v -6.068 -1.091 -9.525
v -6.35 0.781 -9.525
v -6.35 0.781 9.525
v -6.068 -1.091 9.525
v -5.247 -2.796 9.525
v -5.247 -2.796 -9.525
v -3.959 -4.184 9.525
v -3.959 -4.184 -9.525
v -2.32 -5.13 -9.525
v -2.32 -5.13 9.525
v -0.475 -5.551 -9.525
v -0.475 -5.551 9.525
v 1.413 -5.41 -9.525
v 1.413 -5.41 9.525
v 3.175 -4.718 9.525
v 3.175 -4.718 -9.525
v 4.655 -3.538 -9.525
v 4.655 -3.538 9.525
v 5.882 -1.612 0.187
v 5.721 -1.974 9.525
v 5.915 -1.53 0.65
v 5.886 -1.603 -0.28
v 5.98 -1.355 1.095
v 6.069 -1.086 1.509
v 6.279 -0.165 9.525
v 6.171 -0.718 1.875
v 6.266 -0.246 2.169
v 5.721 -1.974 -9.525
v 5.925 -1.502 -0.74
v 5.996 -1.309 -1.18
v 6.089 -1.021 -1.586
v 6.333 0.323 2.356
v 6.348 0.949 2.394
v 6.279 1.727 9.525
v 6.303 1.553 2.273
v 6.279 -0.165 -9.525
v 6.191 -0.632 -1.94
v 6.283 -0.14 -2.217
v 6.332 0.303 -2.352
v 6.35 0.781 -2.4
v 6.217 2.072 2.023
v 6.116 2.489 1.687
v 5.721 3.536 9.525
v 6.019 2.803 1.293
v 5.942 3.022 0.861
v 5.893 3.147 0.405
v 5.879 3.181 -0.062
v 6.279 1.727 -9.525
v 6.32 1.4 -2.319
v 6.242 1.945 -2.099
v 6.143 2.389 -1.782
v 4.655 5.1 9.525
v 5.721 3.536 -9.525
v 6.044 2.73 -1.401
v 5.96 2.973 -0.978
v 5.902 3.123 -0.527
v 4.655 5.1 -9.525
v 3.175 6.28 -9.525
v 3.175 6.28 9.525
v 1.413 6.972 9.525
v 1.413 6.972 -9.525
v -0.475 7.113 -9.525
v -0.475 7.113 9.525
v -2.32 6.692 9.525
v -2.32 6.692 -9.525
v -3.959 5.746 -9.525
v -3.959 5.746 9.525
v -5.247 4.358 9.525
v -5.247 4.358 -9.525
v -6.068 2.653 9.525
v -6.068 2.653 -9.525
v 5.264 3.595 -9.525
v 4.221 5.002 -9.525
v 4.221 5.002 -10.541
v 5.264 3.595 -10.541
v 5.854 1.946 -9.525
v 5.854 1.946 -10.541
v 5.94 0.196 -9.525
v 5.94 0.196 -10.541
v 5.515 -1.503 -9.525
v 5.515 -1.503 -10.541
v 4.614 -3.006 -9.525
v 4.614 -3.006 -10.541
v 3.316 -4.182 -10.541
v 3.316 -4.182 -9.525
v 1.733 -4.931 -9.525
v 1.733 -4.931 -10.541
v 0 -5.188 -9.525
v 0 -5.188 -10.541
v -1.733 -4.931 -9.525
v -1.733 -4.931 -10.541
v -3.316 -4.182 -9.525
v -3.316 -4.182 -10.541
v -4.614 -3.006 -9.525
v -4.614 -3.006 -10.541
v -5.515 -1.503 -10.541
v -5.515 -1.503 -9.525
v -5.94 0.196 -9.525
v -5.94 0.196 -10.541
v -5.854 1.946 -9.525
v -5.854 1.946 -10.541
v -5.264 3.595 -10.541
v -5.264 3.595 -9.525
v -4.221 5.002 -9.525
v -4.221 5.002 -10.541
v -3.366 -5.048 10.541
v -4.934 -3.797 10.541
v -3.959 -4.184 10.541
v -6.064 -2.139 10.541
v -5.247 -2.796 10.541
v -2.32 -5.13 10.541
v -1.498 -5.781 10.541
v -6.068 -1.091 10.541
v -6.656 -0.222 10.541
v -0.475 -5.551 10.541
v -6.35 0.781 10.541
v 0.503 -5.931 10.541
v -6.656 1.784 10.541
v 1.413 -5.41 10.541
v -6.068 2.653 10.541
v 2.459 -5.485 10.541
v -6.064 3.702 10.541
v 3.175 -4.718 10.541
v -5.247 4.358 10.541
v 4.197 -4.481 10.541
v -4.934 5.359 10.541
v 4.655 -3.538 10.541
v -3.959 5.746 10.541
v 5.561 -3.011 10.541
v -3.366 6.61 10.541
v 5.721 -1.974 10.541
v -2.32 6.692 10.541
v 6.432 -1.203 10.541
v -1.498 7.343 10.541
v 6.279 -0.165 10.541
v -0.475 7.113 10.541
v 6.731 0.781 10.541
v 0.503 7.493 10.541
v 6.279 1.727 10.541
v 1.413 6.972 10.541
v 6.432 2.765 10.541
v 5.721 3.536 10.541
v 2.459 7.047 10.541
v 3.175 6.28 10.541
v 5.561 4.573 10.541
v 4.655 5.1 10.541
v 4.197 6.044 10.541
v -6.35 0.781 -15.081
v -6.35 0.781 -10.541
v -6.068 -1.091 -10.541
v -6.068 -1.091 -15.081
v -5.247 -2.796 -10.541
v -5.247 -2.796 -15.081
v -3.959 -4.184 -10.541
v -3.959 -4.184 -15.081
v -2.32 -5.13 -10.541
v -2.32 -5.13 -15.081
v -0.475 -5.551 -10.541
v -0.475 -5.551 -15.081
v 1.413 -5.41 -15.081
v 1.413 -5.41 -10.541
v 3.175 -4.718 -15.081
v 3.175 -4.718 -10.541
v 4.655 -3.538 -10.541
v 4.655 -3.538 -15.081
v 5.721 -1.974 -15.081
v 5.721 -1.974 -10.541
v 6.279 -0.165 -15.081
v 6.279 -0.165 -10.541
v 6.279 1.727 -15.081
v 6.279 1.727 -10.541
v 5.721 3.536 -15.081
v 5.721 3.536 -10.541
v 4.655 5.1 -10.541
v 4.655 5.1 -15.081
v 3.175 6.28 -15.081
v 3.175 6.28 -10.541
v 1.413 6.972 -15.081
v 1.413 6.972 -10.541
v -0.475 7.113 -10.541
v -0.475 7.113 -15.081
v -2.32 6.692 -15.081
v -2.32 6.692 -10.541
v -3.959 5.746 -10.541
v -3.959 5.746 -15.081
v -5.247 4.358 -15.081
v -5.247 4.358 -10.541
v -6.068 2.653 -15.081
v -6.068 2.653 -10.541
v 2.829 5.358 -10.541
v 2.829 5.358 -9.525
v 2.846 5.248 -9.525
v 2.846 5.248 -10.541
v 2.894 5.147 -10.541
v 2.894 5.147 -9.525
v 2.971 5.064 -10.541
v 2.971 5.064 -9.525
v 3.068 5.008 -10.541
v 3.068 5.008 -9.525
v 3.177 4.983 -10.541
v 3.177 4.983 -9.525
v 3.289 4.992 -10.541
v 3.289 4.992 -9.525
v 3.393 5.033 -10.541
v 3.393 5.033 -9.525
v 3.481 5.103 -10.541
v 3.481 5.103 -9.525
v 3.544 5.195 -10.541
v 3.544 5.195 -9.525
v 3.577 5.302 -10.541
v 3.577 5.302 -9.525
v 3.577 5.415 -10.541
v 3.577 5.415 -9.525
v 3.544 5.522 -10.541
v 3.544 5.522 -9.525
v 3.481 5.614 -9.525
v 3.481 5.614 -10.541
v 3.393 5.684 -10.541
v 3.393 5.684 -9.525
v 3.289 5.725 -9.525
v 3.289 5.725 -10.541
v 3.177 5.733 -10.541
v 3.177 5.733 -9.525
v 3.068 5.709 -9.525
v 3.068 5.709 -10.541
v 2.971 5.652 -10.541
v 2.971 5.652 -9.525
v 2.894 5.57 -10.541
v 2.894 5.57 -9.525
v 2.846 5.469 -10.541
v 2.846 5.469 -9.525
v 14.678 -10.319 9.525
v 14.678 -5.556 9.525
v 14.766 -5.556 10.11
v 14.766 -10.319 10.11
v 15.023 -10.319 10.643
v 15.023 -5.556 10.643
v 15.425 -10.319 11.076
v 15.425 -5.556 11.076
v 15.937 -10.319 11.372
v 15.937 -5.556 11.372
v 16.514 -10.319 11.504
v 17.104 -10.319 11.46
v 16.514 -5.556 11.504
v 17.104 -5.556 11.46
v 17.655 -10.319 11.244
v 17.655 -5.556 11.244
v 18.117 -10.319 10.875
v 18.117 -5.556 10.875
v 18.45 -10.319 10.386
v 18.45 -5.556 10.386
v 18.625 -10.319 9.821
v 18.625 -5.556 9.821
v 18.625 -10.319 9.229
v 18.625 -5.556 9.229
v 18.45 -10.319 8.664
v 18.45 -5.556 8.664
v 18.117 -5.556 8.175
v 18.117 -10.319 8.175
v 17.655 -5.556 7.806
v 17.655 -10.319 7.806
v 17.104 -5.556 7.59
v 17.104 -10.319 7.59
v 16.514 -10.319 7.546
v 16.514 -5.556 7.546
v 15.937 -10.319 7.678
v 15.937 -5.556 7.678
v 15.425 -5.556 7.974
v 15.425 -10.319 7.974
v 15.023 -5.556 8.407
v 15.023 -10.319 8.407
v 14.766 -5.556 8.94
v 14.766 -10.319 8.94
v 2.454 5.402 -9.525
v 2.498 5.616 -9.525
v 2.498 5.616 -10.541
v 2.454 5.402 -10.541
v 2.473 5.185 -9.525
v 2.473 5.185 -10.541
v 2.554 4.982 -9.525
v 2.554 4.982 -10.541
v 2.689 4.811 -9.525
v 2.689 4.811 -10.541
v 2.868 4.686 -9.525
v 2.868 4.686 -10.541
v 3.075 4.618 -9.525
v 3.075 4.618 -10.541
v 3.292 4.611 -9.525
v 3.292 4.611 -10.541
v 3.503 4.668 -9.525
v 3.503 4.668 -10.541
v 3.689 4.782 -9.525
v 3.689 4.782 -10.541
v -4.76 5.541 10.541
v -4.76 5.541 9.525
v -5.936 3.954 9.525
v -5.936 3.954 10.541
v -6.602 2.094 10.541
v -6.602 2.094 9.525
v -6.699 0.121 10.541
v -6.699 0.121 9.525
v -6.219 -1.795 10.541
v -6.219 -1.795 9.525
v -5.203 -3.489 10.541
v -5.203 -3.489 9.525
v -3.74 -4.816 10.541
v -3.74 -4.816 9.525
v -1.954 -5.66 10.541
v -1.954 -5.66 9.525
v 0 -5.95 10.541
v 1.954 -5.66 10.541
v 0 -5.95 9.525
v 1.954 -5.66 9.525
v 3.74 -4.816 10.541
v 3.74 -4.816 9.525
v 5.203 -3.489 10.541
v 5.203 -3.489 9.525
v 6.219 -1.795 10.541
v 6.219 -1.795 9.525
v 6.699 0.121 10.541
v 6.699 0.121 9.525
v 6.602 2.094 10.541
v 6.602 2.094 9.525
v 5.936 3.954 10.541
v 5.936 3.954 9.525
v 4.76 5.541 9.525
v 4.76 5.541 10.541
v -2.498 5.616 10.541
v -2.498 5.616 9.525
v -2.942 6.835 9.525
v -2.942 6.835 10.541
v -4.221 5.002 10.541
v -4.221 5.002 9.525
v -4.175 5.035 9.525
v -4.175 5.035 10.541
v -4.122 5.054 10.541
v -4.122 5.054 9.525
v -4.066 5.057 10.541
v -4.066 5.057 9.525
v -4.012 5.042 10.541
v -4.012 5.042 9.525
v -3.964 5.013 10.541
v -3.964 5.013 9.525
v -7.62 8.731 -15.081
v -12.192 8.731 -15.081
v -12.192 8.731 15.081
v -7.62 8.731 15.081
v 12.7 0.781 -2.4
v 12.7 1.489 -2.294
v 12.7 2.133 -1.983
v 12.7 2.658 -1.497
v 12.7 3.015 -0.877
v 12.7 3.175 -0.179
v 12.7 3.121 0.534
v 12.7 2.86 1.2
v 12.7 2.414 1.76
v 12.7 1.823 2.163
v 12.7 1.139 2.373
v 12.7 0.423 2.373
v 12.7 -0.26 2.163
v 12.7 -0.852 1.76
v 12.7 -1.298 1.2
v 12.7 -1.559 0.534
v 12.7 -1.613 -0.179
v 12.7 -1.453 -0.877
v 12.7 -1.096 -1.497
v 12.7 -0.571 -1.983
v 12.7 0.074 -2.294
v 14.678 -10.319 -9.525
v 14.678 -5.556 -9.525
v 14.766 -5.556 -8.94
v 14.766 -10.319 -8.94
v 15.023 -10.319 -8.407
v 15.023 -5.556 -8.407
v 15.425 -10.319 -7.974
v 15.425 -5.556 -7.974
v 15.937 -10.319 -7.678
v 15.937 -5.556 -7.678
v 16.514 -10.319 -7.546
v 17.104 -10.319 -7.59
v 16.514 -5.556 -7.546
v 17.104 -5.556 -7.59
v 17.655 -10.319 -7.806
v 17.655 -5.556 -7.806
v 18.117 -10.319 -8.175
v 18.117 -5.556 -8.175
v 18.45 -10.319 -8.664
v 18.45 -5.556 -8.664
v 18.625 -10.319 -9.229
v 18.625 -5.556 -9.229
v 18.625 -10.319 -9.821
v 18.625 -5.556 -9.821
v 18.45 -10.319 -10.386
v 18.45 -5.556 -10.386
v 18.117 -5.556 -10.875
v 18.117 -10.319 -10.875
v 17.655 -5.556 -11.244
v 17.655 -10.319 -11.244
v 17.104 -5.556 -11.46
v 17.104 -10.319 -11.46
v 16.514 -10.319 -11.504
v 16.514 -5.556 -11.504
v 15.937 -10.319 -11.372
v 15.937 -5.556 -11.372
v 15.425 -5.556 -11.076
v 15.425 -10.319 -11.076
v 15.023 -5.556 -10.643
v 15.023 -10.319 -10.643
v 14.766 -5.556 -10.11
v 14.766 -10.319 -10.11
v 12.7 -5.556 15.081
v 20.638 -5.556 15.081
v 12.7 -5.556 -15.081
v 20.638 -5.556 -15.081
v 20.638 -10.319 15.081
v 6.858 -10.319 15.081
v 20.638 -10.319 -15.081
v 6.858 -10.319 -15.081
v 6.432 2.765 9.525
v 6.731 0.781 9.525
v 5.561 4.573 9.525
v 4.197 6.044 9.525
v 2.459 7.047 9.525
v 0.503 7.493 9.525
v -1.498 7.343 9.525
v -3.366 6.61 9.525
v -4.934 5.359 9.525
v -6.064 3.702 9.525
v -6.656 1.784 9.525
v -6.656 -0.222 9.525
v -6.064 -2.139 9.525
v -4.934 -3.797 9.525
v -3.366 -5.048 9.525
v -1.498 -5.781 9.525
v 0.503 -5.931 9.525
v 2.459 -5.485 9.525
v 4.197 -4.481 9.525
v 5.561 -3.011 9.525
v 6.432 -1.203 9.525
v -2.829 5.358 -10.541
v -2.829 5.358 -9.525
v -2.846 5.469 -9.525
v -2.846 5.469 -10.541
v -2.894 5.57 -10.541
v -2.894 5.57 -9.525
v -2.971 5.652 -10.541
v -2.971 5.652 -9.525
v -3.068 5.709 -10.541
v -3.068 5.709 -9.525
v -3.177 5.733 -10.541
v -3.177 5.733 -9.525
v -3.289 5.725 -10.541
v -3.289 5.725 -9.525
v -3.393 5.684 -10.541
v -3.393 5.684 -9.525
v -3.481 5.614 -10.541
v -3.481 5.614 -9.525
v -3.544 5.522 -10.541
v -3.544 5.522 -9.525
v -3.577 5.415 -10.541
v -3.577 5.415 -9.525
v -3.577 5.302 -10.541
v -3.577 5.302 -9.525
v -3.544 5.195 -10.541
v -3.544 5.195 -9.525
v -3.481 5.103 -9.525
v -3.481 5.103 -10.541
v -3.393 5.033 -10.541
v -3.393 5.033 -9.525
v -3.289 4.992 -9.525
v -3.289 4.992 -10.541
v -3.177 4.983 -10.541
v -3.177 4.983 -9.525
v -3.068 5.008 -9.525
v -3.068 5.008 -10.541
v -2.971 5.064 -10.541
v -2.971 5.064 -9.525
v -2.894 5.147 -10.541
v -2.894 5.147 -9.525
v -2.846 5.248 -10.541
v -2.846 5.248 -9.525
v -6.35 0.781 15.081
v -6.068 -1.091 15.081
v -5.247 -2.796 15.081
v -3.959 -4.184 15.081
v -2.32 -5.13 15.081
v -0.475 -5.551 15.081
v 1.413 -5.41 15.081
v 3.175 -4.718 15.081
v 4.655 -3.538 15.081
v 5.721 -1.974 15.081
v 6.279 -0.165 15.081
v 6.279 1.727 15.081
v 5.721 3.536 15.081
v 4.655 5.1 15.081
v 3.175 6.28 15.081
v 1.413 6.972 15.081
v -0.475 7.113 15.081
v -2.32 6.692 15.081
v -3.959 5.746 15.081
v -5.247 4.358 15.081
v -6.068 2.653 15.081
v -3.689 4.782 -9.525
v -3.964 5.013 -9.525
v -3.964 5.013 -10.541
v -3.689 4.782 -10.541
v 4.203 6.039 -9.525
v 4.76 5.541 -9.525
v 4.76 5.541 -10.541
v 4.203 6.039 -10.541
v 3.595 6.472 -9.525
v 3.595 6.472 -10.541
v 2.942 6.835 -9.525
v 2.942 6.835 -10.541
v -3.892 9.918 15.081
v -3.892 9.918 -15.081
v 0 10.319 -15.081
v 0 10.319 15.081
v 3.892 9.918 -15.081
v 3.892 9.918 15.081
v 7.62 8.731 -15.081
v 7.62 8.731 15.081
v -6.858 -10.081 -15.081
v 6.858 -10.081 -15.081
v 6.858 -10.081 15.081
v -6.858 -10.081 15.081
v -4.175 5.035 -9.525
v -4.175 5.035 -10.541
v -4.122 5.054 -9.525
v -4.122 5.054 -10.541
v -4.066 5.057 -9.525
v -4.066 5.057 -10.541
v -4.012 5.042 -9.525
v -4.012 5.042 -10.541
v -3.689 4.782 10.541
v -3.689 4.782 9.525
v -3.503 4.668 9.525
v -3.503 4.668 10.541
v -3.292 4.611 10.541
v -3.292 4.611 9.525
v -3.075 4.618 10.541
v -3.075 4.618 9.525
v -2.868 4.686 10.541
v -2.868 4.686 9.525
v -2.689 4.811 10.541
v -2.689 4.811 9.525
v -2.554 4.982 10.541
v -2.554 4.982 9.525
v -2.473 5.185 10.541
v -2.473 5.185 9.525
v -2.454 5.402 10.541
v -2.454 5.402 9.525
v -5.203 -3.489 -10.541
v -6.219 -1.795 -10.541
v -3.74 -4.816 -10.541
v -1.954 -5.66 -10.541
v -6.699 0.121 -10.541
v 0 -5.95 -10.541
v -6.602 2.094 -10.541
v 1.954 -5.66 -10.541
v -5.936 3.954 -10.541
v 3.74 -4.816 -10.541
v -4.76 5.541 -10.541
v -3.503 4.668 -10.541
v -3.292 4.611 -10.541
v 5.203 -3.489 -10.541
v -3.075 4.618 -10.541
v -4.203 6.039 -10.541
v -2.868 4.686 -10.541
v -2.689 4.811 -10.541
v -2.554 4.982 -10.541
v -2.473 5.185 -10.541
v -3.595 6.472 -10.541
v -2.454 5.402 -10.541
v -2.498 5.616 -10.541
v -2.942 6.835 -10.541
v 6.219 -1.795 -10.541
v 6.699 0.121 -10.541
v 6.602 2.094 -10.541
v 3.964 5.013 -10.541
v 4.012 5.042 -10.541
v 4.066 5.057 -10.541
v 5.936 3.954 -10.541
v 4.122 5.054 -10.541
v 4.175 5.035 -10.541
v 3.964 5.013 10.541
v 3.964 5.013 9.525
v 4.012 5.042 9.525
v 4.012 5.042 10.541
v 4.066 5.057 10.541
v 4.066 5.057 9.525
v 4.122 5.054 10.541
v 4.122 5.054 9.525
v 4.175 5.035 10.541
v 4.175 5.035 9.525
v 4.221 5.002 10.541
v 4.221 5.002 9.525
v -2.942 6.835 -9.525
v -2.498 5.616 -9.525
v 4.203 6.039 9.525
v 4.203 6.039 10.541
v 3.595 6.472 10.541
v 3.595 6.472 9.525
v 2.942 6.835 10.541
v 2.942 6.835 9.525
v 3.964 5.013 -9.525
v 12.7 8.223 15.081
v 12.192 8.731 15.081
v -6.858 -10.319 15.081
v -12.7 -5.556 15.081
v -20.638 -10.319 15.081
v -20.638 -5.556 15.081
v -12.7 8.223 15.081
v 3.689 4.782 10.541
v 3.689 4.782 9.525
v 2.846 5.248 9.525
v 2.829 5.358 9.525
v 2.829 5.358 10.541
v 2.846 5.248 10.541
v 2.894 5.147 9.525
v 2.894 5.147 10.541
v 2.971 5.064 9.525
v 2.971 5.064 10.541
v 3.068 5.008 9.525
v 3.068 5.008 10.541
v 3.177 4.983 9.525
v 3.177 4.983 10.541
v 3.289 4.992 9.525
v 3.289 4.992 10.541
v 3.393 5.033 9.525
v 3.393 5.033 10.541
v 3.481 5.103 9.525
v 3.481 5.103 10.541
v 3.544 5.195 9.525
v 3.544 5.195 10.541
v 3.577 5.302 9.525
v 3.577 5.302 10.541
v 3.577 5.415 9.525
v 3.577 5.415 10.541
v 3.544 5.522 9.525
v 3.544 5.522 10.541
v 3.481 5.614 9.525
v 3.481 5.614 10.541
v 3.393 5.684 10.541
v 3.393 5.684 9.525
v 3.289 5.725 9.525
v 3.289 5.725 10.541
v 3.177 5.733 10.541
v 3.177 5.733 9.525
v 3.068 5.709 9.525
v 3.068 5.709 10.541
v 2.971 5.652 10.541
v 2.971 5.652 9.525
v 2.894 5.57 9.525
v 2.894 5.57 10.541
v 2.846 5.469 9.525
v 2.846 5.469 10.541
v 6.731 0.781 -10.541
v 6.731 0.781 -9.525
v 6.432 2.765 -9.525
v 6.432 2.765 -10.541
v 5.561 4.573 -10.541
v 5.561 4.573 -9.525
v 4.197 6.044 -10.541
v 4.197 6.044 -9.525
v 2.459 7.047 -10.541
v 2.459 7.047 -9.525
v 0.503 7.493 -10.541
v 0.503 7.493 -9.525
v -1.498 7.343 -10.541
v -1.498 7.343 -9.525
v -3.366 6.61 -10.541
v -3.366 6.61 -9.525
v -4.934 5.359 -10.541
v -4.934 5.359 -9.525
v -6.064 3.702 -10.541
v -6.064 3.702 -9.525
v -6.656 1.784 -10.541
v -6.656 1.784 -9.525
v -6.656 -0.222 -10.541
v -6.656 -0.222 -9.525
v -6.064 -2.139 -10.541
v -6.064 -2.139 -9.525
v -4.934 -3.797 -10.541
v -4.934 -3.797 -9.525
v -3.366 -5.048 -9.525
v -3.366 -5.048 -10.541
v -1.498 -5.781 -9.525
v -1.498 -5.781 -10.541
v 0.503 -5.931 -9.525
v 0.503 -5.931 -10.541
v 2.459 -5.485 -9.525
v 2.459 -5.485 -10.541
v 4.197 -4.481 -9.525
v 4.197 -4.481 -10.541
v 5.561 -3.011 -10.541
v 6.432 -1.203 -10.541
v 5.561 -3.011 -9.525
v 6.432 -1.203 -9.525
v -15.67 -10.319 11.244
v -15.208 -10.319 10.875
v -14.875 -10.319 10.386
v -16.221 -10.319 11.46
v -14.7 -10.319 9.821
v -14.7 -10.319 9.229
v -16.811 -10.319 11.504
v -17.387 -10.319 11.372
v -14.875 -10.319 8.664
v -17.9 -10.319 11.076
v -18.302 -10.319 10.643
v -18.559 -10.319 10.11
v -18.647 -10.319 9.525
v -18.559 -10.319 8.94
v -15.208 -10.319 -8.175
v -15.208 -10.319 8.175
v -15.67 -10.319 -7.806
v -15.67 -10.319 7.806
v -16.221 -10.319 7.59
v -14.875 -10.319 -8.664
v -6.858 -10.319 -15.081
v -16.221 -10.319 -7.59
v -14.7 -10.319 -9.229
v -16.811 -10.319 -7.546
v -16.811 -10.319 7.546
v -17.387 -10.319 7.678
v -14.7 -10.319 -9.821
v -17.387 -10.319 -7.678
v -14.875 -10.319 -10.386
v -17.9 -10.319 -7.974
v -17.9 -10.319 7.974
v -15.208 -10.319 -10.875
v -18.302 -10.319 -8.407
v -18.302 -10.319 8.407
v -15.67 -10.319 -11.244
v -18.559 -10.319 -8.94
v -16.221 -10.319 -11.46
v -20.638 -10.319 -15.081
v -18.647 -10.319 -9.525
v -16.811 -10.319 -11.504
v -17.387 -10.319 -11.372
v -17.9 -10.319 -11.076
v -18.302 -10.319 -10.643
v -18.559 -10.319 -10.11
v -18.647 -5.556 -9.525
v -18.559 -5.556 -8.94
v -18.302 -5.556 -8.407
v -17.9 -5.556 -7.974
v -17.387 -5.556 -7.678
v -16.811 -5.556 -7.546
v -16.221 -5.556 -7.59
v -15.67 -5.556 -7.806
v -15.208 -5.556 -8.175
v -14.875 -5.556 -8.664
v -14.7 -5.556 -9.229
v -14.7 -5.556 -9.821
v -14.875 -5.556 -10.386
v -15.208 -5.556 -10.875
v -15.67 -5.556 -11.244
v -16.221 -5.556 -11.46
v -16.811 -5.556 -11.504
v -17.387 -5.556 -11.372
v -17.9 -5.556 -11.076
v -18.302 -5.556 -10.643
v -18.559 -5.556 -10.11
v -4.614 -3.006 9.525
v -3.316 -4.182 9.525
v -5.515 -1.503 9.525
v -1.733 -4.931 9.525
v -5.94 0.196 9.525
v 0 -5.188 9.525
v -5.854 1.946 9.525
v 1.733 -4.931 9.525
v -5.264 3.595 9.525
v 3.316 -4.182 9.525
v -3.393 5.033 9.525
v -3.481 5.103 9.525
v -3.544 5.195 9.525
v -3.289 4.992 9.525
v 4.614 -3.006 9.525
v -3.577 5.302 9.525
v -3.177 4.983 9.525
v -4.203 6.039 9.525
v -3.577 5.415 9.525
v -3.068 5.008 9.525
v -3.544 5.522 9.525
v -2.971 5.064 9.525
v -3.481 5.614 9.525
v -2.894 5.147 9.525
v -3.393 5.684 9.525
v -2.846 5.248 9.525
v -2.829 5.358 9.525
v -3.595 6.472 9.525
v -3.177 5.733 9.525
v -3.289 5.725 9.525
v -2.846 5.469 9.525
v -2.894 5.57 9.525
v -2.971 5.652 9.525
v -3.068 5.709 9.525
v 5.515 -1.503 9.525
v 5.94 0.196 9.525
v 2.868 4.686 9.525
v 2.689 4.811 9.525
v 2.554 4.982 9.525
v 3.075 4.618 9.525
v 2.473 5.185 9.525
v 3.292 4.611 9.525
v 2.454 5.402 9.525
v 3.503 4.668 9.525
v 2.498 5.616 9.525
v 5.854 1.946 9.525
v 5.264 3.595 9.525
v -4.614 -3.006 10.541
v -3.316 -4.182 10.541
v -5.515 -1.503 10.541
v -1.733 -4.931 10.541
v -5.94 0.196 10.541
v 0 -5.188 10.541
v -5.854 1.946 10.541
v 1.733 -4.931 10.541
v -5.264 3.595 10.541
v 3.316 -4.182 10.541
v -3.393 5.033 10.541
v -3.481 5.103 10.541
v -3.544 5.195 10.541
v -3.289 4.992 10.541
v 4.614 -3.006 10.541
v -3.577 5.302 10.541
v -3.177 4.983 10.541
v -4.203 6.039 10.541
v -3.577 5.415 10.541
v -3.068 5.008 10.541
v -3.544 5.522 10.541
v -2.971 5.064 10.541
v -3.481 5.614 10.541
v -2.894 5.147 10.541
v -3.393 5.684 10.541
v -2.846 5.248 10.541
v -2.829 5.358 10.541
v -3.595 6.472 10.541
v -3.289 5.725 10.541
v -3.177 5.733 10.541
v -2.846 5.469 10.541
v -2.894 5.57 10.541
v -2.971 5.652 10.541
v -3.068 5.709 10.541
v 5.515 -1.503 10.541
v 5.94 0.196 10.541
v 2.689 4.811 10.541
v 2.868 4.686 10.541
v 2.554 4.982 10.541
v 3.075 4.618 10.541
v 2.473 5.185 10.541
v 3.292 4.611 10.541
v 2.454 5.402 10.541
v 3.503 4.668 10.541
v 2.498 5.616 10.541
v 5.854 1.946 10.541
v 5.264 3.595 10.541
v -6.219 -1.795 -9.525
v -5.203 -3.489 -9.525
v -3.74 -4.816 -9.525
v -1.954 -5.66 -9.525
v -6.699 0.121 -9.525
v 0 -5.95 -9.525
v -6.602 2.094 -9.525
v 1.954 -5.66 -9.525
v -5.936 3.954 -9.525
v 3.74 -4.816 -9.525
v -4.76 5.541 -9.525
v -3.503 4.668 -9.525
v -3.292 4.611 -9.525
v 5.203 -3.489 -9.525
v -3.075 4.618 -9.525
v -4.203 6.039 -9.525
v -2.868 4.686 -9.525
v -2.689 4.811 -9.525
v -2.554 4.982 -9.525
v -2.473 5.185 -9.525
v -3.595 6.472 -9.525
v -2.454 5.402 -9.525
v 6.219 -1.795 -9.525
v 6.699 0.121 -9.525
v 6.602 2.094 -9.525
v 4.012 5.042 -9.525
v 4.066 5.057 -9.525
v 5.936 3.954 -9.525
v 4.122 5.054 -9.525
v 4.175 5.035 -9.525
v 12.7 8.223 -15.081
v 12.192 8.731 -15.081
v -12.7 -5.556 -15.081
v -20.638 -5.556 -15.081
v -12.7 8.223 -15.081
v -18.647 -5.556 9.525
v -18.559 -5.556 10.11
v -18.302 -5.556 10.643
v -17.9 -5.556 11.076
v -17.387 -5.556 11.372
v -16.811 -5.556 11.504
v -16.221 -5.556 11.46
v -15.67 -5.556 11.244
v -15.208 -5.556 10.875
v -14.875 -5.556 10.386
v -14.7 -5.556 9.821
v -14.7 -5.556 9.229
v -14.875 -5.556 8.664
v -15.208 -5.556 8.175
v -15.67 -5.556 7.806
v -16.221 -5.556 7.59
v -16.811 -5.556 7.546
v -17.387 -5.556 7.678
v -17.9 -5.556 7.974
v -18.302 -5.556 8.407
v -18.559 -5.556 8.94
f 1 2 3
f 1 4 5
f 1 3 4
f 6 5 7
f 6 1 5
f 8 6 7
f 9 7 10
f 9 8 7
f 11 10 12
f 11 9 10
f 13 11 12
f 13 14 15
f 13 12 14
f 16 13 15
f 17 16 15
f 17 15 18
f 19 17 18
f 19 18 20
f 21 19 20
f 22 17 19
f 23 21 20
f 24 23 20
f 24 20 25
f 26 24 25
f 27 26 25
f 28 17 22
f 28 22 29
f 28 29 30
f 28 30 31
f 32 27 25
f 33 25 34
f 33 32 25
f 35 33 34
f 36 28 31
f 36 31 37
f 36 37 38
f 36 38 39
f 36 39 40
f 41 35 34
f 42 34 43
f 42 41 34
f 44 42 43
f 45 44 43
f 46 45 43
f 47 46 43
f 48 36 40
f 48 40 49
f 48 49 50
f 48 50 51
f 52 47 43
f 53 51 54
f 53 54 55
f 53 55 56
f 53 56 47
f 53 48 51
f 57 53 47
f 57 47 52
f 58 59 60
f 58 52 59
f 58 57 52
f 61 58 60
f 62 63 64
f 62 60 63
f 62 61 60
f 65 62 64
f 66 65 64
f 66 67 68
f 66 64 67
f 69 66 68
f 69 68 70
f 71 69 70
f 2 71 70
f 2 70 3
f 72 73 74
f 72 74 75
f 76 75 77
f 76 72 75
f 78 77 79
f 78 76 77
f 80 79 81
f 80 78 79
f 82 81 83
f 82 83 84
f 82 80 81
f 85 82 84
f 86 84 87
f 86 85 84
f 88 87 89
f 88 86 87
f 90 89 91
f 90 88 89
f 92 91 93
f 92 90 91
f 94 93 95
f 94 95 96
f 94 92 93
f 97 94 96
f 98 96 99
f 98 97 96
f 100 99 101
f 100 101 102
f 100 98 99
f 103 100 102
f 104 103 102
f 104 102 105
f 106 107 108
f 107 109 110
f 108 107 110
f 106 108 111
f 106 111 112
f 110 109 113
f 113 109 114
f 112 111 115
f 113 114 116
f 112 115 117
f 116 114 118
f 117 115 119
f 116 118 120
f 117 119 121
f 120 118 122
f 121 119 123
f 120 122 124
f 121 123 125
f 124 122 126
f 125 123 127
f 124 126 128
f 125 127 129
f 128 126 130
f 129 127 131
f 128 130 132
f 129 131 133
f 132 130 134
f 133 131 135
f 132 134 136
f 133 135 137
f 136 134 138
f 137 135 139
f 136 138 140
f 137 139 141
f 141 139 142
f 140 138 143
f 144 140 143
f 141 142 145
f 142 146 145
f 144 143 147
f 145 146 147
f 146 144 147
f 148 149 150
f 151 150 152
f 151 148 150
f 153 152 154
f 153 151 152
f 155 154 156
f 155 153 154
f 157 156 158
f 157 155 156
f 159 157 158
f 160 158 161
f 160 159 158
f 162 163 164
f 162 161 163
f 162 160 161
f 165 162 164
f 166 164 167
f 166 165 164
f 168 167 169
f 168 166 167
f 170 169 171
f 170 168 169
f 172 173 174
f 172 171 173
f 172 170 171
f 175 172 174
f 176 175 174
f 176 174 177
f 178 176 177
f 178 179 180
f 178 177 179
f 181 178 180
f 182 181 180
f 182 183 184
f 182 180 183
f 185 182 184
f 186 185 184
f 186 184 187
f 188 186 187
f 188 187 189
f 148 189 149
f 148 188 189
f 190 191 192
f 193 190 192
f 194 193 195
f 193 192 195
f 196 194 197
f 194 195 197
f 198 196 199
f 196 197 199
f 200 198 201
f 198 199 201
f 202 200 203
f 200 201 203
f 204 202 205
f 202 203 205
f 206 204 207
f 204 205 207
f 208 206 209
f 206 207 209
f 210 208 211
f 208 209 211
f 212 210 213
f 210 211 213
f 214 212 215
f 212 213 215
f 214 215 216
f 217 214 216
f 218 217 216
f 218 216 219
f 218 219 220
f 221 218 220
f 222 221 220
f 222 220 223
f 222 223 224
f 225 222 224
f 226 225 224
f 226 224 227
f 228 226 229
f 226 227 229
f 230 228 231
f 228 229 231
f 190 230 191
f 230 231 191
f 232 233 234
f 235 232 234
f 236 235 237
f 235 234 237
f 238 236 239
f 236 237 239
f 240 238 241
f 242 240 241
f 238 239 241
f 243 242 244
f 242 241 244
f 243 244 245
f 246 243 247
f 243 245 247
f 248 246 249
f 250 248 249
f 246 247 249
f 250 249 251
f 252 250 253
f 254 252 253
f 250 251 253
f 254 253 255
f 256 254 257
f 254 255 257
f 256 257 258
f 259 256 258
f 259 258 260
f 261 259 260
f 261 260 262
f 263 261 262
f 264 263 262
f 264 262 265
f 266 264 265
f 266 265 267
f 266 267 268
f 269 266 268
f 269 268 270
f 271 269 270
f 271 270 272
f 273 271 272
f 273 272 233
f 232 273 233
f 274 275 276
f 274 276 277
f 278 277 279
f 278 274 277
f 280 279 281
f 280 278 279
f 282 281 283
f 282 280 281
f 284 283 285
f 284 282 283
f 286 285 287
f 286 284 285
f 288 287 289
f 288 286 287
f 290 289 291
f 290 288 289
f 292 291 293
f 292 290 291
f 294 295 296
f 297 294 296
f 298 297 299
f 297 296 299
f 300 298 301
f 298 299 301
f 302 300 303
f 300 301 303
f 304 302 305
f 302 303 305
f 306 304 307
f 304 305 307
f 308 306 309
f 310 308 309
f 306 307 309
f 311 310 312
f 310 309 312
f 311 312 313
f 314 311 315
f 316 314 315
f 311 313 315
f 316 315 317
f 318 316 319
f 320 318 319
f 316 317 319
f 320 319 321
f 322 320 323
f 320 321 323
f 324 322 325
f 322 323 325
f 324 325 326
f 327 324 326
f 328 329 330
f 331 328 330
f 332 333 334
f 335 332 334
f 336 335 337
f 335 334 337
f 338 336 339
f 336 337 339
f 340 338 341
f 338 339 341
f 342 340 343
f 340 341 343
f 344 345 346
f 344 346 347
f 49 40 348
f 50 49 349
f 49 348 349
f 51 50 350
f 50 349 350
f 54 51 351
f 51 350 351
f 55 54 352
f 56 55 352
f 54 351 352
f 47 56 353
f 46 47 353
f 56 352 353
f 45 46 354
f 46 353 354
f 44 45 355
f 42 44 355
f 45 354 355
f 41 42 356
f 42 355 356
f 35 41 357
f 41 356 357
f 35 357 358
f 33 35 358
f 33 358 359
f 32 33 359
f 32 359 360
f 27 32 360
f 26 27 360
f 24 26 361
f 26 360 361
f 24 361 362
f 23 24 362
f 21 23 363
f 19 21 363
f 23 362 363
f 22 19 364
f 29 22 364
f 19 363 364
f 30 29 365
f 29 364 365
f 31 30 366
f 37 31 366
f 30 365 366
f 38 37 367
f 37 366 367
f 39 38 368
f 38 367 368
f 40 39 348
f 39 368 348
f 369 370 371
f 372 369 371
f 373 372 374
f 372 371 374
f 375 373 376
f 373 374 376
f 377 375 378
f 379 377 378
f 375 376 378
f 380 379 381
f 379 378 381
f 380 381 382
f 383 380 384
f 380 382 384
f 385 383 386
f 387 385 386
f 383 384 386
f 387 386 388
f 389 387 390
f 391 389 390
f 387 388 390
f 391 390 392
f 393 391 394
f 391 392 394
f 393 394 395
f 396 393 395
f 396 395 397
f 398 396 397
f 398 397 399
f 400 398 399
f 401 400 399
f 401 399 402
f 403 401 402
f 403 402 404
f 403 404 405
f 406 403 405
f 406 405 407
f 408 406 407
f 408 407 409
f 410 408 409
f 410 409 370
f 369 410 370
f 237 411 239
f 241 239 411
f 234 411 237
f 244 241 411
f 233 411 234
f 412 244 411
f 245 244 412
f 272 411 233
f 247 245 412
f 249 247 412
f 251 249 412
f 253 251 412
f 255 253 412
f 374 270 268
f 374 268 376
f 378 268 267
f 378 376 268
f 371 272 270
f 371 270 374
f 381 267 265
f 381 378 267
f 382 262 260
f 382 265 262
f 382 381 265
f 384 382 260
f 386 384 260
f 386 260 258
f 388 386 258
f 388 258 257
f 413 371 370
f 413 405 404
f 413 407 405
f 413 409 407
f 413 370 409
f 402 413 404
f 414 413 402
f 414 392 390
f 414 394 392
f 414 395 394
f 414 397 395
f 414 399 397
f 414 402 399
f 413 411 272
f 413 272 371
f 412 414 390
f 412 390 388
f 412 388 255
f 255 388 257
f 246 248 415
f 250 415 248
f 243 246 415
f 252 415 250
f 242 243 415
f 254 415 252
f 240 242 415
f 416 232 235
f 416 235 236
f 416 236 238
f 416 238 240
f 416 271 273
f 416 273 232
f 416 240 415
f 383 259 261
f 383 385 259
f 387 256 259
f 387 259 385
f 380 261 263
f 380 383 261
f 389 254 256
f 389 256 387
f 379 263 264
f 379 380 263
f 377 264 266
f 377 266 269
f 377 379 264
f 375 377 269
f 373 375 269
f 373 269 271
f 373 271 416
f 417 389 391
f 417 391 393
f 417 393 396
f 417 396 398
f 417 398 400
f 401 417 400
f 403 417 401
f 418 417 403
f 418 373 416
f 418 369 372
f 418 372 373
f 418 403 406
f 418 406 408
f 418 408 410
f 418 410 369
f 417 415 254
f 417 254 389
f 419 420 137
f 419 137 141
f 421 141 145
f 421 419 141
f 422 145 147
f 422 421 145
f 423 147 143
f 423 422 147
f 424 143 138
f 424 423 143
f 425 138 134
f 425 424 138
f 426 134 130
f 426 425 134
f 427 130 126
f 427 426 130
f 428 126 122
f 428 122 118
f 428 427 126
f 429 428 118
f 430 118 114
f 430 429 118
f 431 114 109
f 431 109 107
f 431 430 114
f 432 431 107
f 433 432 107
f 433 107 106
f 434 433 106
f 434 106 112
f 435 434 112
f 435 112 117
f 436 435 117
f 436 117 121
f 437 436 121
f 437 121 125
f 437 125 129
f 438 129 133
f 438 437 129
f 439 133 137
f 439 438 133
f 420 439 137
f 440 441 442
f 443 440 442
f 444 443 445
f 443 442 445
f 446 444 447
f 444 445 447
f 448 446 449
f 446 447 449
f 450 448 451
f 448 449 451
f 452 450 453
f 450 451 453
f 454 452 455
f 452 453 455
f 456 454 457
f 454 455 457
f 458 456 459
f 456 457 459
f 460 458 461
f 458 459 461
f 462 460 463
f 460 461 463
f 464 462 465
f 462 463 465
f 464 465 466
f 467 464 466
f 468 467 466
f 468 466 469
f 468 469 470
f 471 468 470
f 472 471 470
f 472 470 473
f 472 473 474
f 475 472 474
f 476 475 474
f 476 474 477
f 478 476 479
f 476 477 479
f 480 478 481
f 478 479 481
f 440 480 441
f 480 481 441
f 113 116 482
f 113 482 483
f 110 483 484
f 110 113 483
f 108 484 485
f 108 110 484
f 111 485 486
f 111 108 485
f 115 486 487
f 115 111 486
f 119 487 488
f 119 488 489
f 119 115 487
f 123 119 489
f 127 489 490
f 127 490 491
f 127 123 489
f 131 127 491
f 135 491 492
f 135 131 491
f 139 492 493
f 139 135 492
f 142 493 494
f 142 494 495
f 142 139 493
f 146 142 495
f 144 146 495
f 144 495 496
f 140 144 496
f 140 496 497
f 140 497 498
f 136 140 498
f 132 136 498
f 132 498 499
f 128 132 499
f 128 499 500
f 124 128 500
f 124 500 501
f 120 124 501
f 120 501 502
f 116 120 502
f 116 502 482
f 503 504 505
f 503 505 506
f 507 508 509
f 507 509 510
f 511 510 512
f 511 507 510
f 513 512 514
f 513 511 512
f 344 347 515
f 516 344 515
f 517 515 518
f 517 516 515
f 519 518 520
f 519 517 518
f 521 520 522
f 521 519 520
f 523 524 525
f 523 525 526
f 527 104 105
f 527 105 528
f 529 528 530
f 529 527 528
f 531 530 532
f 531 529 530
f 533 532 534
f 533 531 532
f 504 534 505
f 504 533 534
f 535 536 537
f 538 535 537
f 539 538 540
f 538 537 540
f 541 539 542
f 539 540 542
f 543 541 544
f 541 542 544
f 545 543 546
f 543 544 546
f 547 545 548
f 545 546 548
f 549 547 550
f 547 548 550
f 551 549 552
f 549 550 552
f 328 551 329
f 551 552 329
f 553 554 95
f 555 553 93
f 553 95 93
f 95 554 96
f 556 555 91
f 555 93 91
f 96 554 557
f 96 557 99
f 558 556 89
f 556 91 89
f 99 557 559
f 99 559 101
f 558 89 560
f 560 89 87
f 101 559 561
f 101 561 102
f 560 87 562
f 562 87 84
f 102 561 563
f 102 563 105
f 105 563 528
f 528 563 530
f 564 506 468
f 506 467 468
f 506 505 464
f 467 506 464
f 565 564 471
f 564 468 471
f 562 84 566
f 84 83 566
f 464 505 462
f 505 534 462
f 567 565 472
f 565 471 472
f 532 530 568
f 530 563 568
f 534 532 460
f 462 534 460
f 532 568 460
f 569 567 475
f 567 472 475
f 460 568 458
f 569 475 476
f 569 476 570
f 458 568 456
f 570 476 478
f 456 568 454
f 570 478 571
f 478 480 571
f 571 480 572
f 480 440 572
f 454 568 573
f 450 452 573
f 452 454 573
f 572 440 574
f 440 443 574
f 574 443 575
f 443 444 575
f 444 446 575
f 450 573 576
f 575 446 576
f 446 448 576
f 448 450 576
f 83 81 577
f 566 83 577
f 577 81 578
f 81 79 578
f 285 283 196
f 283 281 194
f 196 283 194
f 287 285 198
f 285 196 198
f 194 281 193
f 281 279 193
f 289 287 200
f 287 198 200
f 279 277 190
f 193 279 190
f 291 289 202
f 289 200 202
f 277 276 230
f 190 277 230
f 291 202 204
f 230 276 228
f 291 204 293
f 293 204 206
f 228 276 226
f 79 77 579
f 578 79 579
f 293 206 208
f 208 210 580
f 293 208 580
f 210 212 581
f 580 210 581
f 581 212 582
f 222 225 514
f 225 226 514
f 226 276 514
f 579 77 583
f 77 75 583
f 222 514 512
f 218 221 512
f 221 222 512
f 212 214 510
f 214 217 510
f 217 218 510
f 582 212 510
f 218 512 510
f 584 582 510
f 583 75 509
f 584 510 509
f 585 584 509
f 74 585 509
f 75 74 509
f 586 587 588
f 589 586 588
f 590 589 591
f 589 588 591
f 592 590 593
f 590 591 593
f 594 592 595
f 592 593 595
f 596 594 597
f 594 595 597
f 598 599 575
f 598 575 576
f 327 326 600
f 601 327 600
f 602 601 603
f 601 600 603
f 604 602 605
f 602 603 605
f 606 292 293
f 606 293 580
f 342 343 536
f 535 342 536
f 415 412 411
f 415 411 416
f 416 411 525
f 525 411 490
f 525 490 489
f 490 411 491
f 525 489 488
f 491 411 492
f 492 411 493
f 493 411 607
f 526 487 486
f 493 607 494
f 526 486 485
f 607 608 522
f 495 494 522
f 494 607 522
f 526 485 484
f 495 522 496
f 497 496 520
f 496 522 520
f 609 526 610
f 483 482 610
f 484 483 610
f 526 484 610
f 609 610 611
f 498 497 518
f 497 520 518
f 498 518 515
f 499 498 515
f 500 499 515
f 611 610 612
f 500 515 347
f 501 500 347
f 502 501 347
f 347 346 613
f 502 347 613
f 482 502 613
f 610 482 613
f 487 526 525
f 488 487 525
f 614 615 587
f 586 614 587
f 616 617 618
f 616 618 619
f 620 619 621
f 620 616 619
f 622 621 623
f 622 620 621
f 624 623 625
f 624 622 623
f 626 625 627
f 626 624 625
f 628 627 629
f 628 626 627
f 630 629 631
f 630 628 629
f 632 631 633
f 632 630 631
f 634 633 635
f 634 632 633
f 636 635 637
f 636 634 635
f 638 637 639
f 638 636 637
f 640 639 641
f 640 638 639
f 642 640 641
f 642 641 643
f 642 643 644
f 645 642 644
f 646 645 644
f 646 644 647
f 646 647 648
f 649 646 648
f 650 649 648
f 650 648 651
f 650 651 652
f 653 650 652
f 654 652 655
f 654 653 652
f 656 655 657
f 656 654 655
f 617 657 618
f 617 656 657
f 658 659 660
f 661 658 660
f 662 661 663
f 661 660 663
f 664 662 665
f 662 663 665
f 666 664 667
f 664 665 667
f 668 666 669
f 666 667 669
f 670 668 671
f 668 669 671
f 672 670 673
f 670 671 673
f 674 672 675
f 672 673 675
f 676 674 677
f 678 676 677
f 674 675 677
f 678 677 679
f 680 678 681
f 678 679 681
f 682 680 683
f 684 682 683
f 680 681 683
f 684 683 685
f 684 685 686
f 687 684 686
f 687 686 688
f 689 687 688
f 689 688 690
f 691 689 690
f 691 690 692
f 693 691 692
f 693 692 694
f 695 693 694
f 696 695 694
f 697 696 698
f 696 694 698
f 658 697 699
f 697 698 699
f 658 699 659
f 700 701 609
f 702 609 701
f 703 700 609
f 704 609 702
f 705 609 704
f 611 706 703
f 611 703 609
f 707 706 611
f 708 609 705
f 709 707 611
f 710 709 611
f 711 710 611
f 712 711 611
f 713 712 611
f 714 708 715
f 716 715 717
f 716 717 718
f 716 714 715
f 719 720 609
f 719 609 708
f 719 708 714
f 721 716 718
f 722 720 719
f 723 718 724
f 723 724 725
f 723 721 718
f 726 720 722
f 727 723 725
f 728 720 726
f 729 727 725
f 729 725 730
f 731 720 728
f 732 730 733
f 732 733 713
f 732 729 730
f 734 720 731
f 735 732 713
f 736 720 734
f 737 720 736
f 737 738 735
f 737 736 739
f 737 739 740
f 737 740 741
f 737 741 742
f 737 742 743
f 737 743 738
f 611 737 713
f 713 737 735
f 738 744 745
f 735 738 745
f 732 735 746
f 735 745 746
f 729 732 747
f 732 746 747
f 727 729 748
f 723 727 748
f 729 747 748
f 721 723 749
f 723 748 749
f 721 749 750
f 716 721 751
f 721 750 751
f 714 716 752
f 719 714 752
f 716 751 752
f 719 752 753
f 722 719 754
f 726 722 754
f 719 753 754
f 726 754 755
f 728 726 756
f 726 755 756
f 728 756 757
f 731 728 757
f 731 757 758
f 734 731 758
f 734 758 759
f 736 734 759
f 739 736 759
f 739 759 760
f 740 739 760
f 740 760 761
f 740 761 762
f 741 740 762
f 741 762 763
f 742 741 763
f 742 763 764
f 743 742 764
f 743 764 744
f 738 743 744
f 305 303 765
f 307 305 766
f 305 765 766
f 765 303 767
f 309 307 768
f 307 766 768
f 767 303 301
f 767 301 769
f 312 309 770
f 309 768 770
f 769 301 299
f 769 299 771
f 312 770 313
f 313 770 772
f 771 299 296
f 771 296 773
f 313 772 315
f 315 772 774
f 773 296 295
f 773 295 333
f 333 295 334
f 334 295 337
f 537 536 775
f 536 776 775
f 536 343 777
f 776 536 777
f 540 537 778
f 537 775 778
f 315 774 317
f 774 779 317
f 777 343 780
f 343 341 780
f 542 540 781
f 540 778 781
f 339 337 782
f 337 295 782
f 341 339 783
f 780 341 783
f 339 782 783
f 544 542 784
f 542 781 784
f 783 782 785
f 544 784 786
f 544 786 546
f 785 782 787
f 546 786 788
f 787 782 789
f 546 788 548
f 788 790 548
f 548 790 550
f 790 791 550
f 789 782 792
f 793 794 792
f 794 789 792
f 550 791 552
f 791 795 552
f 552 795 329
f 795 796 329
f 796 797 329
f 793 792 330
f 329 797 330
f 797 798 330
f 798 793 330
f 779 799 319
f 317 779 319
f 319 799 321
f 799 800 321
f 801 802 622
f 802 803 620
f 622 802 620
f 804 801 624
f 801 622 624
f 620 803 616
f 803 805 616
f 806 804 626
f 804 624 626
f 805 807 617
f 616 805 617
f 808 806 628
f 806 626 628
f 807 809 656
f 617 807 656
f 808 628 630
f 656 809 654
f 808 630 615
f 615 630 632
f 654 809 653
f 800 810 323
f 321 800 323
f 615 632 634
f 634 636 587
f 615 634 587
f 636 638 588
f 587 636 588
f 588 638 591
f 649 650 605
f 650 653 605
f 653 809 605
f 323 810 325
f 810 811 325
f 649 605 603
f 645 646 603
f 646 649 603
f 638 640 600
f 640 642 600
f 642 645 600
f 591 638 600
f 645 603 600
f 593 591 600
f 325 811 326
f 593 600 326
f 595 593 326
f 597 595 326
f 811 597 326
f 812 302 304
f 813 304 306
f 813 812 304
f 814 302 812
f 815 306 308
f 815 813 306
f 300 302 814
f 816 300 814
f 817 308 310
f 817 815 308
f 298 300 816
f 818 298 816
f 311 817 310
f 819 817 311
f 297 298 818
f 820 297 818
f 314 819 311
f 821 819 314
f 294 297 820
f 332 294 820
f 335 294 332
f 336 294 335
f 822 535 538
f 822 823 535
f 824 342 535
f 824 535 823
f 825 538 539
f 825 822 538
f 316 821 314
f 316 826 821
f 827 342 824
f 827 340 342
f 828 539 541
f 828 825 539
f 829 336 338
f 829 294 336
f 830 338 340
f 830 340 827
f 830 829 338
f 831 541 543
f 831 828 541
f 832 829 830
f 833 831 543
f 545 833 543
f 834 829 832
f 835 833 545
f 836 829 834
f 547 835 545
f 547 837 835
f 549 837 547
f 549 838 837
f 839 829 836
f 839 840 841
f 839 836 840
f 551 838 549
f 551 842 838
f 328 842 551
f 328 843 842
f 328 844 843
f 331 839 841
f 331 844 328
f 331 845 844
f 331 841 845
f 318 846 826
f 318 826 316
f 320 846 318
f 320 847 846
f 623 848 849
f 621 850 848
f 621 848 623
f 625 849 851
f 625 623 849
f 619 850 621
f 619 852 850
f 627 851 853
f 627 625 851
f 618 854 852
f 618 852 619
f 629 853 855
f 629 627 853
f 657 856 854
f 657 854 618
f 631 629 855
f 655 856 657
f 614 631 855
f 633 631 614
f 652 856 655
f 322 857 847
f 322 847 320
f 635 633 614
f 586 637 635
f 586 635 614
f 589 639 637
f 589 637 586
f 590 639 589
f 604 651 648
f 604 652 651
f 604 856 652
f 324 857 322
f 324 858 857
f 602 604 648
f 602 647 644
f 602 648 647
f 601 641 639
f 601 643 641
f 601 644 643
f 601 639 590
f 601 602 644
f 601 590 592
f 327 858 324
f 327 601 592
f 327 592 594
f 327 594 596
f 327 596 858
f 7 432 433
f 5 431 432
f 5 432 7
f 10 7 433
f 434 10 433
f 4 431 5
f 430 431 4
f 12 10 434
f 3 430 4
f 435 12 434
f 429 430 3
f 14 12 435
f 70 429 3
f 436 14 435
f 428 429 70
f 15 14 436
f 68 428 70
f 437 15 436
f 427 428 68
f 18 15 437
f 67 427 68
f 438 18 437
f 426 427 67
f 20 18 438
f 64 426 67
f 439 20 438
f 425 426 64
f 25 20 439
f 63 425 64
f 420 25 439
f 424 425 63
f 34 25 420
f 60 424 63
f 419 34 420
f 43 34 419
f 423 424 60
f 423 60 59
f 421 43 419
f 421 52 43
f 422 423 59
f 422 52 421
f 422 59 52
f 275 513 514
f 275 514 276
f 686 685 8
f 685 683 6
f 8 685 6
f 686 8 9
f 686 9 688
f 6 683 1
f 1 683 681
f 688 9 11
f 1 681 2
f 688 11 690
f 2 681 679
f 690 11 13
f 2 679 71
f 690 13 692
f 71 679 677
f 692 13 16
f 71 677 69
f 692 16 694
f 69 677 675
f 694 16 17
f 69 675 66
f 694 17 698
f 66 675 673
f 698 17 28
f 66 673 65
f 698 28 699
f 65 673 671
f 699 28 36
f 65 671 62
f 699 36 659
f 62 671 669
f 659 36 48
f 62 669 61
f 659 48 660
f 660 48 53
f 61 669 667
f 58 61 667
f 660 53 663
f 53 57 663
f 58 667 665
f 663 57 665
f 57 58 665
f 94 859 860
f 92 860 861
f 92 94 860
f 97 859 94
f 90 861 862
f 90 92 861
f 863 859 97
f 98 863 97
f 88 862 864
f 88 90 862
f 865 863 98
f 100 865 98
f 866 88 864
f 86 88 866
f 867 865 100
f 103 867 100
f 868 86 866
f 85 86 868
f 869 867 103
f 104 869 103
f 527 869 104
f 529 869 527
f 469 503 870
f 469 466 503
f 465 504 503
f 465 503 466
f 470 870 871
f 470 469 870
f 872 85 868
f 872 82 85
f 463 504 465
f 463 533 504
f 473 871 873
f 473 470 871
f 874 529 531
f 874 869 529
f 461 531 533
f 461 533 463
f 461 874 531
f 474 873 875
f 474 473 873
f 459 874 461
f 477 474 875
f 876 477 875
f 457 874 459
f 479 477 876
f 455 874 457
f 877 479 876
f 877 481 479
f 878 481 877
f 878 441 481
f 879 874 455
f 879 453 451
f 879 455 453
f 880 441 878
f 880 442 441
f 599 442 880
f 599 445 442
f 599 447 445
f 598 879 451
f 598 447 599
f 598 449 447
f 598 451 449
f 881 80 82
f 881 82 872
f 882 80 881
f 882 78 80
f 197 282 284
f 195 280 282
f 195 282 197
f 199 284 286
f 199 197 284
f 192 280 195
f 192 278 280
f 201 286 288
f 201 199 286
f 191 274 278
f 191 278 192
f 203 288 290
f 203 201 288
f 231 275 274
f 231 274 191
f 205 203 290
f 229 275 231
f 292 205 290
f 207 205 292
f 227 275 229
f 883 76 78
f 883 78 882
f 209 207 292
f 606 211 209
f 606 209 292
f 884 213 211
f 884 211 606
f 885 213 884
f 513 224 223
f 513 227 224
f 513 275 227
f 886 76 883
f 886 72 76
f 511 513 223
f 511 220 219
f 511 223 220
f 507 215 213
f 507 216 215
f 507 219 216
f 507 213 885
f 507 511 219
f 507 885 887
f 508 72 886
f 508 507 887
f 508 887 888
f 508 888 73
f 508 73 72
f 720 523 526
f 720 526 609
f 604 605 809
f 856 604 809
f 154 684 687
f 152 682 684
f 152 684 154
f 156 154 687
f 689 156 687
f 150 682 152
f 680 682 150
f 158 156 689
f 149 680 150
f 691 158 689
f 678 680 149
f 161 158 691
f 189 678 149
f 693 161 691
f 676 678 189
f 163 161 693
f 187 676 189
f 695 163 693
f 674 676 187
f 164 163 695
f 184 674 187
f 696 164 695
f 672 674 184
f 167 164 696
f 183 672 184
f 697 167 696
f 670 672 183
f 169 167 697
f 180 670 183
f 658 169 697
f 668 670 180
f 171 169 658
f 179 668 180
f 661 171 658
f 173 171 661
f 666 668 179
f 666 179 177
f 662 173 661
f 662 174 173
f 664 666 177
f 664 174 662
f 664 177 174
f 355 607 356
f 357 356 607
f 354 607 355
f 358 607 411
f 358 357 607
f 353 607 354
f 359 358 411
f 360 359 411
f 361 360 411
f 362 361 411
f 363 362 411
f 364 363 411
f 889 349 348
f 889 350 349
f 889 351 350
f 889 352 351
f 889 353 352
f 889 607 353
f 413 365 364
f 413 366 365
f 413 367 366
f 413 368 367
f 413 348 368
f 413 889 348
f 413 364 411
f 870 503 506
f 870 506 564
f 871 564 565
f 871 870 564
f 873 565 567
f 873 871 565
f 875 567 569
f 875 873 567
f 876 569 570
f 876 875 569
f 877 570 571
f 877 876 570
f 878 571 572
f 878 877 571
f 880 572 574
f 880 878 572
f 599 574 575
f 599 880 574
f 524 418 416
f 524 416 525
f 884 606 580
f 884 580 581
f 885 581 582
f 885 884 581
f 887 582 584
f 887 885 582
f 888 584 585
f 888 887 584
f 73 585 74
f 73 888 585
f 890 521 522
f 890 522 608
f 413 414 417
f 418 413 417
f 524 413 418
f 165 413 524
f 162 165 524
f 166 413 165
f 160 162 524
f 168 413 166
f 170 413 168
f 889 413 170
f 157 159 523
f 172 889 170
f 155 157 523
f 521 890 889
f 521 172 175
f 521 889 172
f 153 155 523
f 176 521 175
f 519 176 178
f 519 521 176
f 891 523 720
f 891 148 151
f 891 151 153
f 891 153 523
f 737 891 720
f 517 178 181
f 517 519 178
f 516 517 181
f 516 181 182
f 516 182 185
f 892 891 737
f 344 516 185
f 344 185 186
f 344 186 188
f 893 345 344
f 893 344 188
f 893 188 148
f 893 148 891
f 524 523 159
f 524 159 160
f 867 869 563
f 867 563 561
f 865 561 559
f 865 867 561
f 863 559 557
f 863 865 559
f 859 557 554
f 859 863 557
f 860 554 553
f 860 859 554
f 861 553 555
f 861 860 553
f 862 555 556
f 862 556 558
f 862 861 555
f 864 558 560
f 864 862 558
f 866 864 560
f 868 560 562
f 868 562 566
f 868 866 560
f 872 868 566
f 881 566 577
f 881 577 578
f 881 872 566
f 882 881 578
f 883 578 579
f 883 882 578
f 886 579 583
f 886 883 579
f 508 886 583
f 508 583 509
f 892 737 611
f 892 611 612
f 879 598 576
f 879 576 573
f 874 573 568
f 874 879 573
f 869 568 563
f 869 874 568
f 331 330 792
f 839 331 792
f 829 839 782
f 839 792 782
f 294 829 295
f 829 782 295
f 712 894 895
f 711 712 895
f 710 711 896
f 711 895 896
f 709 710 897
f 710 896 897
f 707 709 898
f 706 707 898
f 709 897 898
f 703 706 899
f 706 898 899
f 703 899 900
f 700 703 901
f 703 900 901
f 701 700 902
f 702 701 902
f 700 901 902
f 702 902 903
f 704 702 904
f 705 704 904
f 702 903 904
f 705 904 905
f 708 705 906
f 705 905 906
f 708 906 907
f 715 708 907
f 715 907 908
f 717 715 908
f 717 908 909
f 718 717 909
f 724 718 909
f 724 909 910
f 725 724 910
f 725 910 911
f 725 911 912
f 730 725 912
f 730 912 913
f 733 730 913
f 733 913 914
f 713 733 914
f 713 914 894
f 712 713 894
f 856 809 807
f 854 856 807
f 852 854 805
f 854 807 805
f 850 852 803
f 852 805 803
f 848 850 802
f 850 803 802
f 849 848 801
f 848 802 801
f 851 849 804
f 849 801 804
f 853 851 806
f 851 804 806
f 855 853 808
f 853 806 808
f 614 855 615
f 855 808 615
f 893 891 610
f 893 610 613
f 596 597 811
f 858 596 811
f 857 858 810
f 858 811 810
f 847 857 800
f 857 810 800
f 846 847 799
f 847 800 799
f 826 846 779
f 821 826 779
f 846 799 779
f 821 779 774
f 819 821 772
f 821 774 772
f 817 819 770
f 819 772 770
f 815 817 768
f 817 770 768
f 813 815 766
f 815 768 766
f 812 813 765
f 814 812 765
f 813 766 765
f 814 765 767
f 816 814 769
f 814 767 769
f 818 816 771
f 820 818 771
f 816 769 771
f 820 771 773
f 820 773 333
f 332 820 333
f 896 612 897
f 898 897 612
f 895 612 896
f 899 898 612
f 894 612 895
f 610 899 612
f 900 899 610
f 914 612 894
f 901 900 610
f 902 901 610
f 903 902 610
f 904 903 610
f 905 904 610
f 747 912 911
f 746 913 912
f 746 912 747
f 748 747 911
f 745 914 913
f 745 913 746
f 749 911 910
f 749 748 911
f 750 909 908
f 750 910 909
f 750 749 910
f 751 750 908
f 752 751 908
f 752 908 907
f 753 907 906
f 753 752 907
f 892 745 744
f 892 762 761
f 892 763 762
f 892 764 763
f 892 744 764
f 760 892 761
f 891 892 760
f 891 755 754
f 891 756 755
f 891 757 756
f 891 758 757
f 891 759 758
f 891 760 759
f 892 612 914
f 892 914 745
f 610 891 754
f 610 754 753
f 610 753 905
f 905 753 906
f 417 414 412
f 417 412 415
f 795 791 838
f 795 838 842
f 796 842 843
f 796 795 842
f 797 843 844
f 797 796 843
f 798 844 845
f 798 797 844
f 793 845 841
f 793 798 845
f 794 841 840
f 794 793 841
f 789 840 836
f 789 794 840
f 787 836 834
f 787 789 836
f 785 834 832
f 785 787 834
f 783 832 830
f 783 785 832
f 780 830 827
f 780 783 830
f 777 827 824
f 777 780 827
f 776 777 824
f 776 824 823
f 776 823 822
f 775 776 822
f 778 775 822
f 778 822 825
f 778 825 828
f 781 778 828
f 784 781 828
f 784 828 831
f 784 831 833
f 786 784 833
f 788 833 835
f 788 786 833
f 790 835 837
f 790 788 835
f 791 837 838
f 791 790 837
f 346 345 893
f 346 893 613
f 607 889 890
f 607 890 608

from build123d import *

# Parameters (mm, degrees)
BOSS_EXTRUDE1_START     = -15.08125
SKETCH4_R               = 6.35
BOSS_EXTRUDE1_DEPTH     = 30.1625
SKETCH5_R               = 1.984375
CUT_EXTRUDE1_DEPTH      = 31.089302631
CHAMFER1_SIZE           = 0.508
SKETCH6_R               = 6.731
CUT_EXTRUDE2_DEPTH      = 1.016
CUT_EXTRUDE3_REACH      = 40.017
CUT_EXTRUDE3_END_RADIUS = 6.35
SKETCH7_R               = 2.4003
SKETCH8_R               = 0.376075682
BOSS_EXTRUDE2_DEPTH     = 1.016


with BuildPart() as part:
    # Sketch4 → Boss-Extrude1 (new body)
    with BuildSketch(Plane.XY.offset(BOSS_EXTRUDE1_START)):
        with BuildLine():
            Line((-20.6375, -5.55625), (-12.7, -5.55625))
            Line((-12.7, -5.55625), (-12.7, 8.73125))
            Line((-12.7, 8.73125), (-7.62, 8.73125))
            ThreePointArc((-7.62, 8.73125), (0, 10.31875), (7.62, 8.73125))
            Line((7.62, 8.73125), (12.7, 8.73125))
            Line((12.7, 8.73125), (12.7, -5.55625))
            Line((12.7, -5.55625), (20.6375, -5.55625))
            Line((20.6375, -5.55625), (20.6375, -10.31875))
            Line((20.6375, -10.31875), (6.858, -10.31875))
            Line((6.858, -10.31875), (6.858, -10.080625))
            Line((6.858, -10.080625), (-6.858, -10.080625))
            Line((-6.858, -10.080625), (-6.858, -10.31875))
            Line((-6.858, -10.31875), (-20.6375, -10.31875))
            Line((-20.6375, -10.31875), (-20.6375, -5.55625))
        make_face()
        with Locations(Location((0, 0.78105, 0), (0, 0, 180))):
            Circle(SKETCH4_R, mode=Mode.SUBTRACT)
    extrude(amount=BOSS_EXTRUDE1_DEPTH)

    # Sketch5 → Cut-Extrude1 (cut, through all)
    with BuildSketch(Plane(origin=(0, -5.55625, 0), x_dir=(1, 0, 0), z_dir=(0, 1, 0))):
        with Locations(Location((-16.6624, 9.525, 0), (0, 0, 180))):
            Circle(SKETCH5_R)
        with Locations(Location((16.6624, 9.525, 0), (0, 0, 180))):
            Circle(SKETCH5_R)
        with Locations(Location((16.6624, -9.525, 0), (0, 0, 180))):
            Circle(SKETCH5_R)
        with Locations(Location((-16.6624, -9.525, 0), (0, 0, 180))):
            Circle(SKETCH5_R)
    extrude(amount=-CUT_EXTRUDE1_DEPTH, mode=Mode.SUBTRACT)

    # Chamfer1
    chamfer1_edges = [part.edges().sort_by_distance(p)[0] for p in [
        (-12.7, 8.73125, 0),
        (12.7, 8.73125, 0),
    ]]
    chamfer(chamfer1_edges, length=CHAMFER1_SIZE)

    # Sketch6 → Cut-Extrude2 (cut)
    with BuildSketch(Plane.XY.offset(9.525)):
        with Locations((0, 0.78105)):
            Circle(SKETCH6_R)
    cut_extrude2 = extrude(amount=CUT_EXTRUDE2_DEPTH, mode=Mode.SUBTRACT)

    # Mirror1: Cut-Extrude2 across plane
    add(cut_extrude2.mirror(Plane.XY), mode=Mode.SUBTRACT)

    # Cut-Extrude3: up to this cylinder (the profile starts outside it)
    cut_extrude3_end = Plane(origin=(0, 0.78105, 0), z_dir=(0, 0, -1)) * Cylinder(CUT_EXTRUDE3_END_RADIUS, 93.734, mode=Mode.PRIVATE)
    # Sketch7 → Cut-Extrude3 (cut, up to the surface)
    with BuildSketch(Plane(origin=(12.7, 0, 0), x_dir=(0, 0, -1), z_dir=(1, 0, 0)), mode=Mode.PRIVATE) as cut_extrude3_sk1:
        with Locations((0, 0.78105)):
            Circle(SKETCH7_R)
    cut_extrude3_tool1 = extrude(cut_extrude3_sk1.sketch, amount=-CUT_EXTRUDE3_REACH, mode=Mode.PRIVATE) - cut_extrude3_end
    add(cut_extrude3_tool1.solids().sort_by_distance((12.7, 0.78105, 0))[0], mode=Mode.SUBTRACT)


with BuildPart() as body_2:
    # Sketch8 → Boss-Extrude2 (new body)
    with BuildSketch(Plane.XY.offset(9.525)):
        with BuildLine():
            Line((-2.498354039, 5.615722541), (-2.942132023, 6.83499253))
            ThreePointArc((-2.942132023, 6.83499253), (-3.904842357, 6.263619395), (-4.759535744, 5.540585744))
            ThreePointArc((-4.759535744, 5.540585744), (0, -5.94995), (4.759535744, 5.540585744))
            ThreePointArc((4.759535744, 5.540585744), (3.904842357, 6.263619395), (2.942132023, 6.83499253))
            Line((2.942132023, 6.83499253), (2.498354039, 5.615722541))
            ThreePointArc((2.498354039, 5.615722541), (2.773728827, 4.742345296), (3.688618704, 4.78229025))
            Line((3.688618704, 4.78229025), (3.963565495, 5.012998002))
            ThreePointArc((3.963565495, 5.012998002), (4.094326028, 5.057385221), (4.220720377, 5.001770377))
            ThreePointArc((4.220720377, 5.001770377), (0, -5.18795), (-4.220720377, 5.001770377))
            ThreePointArc((-4.220720377, 5.001770377), (-4.094326028, 5.057385221), (-3.963565495, 5.012998002))
            Line((-3.963565495, 5.012998002), (-3.688618704, 4.78229025))
            ThreePointArc((-3.688618704, 4.78229025), (-2.773728827, 4.742345296), (-2.498354039, 5.615722541))
        make_face()
        with Locations((-3.205145126, 5.358471623)):
            Circle(SKETCH8_R, mode=Mode.SUBTRACT)
        with Locations(Location((3.205145126, 5.358471623, 0), (0, 0, 180))):
            Circle(SKETCH8_R, mode=Mode.SUBTRACT)
    extrude(amount=BOSS_EXTRUDE2_DEPTH)


with BuildPart() as body_3:
    # Mirror2: mirrored copy
    add(body_2.part.mirror(Plane.XY))


solid = Compound([part.part, body_2.part, body_3.part])
